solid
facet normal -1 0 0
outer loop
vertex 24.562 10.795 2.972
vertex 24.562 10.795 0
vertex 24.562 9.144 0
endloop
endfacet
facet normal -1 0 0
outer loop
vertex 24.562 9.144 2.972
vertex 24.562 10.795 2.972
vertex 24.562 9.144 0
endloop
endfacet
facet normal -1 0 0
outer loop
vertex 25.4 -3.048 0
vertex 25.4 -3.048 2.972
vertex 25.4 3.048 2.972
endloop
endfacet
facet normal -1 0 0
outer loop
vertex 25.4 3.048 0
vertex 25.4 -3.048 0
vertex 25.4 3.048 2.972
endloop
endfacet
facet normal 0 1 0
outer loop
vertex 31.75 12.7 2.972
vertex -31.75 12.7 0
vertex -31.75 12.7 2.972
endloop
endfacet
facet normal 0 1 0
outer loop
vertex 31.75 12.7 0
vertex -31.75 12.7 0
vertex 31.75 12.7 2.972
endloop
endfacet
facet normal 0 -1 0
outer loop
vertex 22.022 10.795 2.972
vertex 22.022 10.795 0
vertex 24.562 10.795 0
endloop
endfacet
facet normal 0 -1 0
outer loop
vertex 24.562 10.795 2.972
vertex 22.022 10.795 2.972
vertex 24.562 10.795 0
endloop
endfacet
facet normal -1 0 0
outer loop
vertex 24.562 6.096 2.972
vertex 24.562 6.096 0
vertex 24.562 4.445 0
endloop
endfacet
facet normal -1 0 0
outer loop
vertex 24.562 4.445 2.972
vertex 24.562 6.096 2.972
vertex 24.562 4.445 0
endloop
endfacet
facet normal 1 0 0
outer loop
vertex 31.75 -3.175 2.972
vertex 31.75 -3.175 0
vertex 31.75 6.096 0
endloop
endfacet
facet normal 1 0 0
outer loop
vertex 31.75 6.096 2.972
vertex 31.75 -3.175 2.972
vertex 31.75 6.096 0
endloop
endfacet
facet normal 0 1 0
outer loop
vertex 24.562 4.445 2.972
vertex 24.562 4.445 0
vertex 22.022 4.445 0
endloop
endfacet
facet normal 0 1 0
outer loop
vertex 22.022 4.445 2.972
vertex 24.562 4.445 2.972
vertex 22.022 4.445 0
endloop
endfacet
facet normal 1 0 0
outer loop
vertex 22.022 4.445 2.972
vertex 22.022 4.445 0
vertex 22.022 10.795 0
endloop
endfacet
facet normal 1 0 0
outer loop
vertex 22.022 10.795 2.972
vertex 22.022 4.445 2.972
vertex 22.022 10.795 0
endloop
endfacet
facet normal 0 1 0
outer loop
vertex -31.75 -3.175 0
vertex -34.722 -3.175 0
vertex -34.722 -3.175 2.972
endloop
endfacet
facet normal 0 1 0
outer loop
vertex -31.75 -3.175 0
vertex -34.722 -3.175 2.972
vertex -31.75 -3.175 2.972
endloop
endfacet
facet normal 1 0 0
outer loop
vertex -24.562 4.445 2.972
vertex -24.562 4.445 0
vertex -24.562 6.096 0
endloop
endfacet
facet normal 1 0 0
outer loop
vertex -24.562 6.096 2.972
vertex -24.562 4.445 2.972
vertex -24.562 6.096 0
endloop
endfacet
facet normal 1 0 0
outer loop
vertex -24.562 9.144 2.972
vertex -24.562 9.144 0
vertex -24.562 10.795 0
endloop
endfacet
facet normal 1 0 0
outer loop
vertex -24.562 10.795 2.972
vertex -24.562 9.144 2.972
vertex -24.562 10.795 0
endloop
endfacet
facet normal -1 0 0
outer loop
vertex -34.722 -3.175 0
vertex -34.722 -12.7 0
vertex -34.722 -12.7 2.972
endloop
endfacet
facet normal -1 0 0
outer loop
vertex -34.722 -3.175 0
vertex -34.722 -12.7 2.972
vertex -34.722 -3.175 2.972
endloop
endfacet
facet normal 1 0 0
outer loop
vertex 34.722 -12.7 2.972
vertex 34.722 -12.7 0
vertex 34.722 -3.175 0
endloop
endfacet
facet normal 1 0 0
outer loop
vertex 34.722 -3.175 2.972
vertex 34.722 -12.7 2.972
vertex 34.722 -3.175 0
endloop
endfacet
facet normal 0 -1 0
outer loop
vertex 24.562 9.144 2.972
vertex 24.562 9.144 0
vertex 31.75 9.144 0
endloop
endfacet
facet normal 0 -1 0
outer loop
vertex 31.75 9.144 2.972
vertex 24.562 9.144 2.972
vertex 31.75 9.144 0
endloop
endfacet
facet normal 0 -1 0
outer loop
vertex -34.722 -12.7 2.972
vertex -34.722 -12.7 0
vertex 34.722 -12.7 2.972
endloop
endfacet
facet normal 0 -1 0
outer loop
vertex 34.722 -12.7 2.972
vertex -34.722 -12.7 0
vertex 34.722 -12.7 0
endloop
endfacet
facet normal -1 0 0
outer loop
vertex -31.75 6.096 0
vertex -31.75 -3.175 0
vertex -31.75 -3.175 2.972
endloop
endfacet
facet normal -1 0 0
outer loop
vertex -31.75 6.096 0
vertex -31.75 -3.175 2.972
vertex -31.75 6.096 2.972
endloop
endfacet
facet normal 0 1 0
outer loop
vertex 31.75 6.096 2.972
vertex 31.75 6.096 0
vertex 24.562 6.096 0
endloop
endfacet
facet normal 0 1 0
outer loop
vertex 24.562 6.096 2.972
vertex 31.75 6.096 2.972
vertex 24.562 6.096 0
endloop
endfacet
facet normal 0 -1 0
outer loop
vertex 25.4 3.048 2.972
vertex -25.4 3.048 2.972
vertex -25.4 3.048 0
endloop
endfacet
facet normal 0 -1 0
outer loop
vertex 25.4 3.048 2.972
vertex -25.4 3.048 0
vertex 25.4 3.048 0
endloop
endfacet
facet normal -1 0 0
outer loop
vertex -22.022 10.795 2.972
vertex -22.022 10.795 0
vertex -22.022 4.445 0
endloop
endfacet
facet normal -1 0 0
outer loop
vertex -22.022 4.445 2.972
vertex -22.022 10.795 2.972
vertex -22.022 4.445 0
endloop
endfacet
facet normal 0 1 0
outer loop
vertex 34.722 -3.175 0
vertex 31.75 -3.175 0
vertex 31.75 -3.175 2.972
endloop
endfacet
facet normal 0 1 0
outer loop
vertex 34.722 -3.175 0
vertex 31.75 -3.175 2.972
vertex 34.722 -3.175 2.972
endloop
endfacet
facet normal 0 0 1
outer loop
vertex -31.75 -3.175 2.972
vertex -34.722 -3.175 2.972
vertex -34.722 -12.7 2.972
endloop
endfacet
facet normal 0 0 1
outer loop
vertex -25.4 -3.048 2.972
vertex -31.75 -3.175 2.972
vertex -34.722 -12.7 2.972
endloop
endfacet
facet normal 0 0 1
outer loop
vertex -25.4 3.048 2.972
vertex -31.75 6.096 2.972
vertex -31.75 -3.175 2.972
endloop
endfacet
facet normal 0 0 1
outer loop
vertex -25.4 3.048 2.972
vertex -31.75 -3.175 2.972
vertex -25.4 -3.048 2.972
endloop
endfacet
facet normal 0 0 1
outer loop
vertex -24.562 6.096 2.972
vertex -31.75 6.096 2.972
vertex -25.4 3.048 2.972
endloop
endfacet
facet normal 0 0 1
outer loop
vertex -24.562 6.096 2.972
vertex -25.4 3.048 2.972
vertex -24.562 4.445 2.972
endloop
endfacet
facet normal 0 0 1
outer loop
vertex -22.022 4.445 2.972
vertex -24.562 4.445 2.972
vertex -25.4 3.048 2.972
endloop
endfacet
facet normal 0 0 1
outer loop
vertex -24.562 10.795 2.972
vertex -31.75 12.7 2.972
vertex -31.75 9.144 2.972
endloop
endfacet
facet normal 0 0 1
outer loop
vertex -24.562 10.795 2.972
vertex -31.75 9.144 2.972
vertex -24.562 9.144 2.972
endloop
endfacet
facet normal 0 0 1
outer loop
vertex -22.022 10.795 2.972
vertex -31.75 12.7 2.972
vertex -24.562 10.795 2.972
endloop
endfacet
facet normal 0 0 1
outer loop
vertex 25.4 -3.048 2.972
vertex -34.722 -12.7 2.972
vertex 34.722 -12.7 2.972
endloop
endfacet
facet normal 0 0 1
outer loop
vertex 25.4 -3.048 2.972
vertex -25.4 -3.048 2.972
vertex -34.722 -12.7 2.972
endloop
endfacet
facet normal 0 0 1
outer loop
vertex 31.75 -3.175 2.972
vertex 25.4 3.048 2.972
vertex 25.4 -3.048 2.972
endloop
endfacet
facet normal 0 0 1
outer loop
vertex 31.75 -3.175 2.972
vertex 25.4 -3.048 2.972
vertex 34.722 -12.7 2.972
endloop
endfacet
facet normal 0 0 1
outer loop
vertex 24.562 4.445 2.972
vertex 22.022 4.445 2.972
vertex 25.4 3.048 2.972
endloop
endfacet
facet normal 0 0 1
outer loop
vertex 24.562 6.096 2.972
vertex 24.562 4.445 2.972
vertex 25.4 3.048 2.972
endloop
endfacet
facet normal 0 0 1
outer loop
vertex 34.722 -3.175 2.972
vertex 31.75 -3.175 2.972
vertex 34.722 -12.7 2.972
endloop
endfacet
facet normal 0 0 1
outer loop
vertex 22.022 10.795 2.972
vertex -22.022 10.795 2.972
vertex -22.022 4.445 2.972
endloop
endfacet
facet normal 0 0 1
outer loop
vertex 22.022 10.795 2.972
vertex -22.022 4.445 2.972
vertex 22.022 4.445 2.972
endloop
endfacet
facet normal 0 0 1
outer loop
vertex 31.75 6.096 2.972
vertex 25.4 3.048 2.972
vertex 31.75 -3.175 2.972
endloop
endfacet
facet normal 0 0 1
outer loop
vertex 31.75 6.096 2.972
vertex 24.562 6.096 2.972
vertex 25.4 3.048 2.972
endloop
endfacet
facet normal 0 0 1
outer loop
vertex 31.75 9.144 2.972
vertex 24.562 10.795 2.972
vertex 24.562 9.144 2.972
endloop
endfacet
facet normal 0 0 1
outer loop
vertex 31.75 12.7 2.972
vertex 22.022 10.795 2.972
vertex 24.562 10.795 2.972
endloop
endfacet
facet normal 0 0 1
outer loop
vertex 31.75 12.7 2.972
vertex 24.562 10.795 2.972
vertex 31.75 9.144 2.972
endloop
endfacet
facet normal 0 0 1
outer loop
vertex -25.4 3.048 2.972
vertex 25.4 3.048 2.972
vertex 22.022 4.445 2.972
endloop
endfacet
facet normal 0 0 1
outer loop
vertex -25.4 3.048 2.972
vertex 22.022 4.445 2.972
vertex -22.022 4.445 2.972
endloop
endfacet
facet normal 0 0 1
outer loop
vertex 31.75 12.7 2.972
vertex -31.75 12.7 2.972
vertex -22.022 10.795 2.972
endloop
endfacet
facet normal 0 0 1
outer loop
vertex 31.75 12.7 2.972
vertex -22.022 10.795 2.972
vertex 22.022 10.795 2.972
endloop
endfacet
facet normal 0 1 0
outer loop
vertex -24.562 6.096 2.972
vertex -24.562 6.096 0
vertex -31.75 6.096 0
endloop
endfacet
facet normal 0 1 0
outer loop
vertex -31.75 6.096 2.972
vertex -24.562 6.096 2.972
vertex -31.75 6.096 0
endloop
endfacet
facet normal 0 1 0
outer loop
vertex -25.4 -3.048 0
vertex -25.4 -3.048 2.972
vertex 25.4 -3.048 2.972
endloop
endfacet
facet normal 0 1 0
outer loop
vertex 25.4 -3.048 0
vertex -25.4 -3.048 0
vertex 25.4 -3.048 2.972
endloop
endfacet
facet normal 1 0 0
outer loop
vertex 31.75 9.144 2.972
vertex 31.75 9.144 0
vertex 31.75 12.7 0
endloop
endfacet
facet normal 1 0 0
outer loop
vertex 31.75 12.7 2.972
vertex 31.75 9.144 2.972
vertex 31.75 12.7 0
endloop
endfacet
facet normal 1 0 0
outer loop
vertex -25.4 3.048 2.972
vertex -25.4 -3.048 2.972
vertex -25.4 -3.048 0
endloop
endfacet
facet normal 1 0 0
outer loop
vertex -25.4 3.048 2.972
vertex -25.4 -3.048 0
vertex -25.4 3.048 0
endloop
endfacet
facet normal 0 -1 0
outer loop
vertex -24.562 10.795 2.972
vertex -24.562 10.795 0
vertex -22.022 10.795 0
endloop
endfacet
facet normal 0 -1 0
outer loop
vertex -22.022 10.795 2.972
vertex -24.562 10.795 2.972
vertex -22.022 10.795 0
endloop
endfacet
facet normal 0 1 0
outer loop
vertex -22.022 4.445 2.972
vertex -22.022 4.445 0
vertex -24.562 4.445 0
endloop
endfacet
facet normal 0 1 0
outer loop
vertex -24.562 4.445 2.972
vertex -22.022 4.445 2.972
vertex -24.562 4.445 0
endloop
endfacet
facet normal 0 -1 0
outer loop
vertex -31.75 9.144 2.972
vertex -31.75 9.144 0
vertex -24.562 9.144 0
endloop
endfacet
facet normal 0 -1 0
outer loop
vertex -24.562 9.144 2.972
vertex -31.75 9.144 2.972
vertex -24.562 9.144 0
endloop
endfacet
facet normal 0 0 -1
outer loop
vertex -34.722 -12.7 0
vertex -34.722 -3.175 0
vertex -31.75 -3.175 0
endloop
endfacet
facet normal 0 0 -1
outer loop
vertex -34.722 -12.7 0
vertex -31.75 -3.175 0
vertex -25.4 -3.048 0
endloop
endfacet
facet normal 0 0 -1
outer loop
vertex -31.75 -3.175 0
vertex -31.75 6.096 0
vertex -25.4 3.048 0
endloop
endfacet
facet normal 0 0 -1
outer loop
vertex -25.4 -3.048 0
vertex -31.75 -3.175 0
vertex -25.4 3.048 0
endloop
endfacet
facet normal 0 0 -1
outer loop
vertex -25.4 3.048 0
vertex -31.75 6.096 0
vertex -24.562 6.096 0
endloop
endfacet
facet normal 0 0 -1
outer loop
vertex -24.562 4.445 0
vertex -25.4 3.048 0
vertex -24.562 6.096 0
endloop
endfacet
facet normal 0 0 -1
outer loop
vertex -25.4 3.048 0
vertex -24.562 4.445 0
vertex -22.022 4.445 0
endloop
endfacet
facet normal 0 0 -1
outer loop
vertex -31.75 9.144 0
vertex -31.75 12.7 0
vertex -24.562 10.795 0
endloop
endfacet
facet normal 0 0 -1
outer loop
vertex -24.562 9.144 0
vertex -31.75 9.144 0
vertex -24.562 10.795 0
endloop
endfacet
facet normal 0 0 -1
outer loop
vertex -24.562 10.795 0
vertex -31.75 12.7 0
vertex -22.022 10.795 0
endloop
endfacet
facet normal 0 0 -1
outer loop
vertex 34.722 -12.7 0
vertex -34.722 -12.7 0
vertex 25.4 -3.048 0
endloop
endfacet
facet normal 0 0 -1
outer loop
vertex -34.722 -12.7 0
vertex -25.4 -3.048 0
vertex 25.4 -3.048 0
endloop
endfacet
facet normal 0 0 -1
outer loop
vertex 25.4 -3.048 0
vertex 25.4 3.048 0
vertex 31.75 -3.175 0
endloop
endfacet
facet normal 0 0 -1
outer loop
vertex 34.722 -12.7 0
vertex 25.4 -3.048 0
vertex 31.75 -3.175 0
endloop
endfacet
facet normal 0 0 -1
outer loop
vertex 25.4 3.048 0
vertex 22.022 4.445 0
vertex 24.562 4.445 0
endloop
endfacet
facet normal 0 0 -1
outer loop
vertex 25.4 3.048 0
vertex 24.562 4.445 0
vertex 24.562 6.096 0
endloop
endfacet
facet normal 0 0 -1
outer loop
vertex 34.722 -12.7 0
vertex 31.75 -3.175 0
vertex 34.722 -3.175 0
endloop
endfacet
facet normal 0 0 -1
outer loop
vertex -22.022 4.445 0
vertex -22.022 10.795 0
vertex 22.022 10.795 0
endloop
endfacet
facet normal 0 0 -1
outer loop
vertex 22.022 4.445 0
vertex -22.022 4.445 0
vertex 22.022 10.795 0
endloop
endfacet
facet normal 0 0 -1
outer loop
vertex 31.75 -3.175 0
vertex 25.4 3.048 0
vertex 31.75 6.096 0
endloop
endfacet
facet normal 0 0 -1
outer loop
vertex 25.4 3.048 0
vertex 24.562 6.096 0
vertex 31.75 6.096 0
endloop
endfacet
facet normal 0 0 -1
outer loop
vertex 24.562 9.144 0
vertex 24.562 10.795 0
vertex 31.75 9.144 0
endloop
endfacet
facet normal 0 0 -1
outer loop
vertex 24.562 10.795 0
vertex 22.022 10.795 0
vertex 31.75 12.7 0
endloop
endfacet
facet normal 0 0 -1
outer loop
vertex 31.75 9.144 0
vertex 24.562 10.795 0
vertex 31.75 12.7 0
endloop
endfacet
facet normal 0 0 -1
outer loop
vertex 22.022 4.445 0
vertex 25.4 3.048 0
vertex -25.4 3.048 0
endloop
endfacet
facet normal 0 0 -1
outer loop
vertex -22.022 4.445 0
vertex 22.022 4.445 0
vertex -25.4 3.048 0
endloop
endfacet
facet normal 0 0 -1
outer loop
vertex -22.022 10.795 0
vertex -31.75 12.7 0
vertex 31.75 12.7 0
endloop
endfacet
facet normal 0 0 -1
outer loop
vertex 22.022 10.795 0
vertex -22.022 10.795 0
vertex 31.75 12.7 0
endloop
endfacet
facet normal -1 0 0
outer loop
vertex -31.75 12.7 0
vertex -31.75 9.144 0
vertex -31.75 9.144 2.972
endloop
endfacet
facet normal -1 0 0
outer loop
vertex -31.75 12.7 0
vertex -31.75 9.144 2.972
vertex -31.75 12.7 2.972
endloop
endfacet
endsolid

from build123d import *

# Parameters (mm, degrees)
SKETCH1_W           = 63.5
SKETCH1_H           = 25.4
SKETCH1_W_2         = 2.9718
SKETCH1_H_2         = 9.525
BOSS_EXTRUDE1_DEPTH = 2.9718
SKETCH2_W           = 50.8
SKETCH2_H           = 6.096
CUT_EXTRUDE1_DEPTH  = 3.9718
CUT_EXTRUDE2_DEPTH  = 3.9718


with BuildPart() as part:
    # Sketch1 → Boss-Extrude1 (new body)
    with BuildSketch(Plane.XY):
        Rectangle(SKETCH1_W, SKETCH1_H)
        with Locations((-33.2359, -7.9375)):
            Rectangle(SKETCH1_W_2, SKETCH1_H_2)
        with Locations((33.2359, -7.9375)):
            Rectangle(SKETCH1_W_2, SKETCH1_H_2)
    extrude(amount=BOSS_EXTRUDE1_DEPTH)

    # Sketch2 → Cut-Extrude1 (cut, through all)
    with BuildSketch(Plane.XY.offset(2.9718)):
        Rectangle(SKETCH2_W, SKETCH2_H)
    extrude(amount=-CUT_EXTRUDE1_DEPTH, mode=Mode.SUBTRACT)

    # Sketch3 → Cut-Extrude2 (cut, through all)
    with BuildSketch(Plane(origin=(0, 0, 0), x_dir=(-1, 0, 0), z_dir=(0, 0, -1))):
        Polygon((22.0218, 10.795), (22.0218, 4.445), (24.5618, 4.445), (24.5618, 6.096), (31.75, 6.096), (31.75, 9.144), (24.5618, 9.144), (24.5618, 10.795), align=None)
        Polygon((-31.75, 9.144), (-31.75, 6.096), (-24.5618, 6.096), (-24.5618, 4.445), (-22.0218, 4.445), (-22.0218, 10.795), (-24.5618, 10.795), (-24.5618, 9.144), align=None)
    extrude(amount=-CUT_EXTRUDE2_DEPTH, mode=Mode.SUBTRACT)


solid = part.part
